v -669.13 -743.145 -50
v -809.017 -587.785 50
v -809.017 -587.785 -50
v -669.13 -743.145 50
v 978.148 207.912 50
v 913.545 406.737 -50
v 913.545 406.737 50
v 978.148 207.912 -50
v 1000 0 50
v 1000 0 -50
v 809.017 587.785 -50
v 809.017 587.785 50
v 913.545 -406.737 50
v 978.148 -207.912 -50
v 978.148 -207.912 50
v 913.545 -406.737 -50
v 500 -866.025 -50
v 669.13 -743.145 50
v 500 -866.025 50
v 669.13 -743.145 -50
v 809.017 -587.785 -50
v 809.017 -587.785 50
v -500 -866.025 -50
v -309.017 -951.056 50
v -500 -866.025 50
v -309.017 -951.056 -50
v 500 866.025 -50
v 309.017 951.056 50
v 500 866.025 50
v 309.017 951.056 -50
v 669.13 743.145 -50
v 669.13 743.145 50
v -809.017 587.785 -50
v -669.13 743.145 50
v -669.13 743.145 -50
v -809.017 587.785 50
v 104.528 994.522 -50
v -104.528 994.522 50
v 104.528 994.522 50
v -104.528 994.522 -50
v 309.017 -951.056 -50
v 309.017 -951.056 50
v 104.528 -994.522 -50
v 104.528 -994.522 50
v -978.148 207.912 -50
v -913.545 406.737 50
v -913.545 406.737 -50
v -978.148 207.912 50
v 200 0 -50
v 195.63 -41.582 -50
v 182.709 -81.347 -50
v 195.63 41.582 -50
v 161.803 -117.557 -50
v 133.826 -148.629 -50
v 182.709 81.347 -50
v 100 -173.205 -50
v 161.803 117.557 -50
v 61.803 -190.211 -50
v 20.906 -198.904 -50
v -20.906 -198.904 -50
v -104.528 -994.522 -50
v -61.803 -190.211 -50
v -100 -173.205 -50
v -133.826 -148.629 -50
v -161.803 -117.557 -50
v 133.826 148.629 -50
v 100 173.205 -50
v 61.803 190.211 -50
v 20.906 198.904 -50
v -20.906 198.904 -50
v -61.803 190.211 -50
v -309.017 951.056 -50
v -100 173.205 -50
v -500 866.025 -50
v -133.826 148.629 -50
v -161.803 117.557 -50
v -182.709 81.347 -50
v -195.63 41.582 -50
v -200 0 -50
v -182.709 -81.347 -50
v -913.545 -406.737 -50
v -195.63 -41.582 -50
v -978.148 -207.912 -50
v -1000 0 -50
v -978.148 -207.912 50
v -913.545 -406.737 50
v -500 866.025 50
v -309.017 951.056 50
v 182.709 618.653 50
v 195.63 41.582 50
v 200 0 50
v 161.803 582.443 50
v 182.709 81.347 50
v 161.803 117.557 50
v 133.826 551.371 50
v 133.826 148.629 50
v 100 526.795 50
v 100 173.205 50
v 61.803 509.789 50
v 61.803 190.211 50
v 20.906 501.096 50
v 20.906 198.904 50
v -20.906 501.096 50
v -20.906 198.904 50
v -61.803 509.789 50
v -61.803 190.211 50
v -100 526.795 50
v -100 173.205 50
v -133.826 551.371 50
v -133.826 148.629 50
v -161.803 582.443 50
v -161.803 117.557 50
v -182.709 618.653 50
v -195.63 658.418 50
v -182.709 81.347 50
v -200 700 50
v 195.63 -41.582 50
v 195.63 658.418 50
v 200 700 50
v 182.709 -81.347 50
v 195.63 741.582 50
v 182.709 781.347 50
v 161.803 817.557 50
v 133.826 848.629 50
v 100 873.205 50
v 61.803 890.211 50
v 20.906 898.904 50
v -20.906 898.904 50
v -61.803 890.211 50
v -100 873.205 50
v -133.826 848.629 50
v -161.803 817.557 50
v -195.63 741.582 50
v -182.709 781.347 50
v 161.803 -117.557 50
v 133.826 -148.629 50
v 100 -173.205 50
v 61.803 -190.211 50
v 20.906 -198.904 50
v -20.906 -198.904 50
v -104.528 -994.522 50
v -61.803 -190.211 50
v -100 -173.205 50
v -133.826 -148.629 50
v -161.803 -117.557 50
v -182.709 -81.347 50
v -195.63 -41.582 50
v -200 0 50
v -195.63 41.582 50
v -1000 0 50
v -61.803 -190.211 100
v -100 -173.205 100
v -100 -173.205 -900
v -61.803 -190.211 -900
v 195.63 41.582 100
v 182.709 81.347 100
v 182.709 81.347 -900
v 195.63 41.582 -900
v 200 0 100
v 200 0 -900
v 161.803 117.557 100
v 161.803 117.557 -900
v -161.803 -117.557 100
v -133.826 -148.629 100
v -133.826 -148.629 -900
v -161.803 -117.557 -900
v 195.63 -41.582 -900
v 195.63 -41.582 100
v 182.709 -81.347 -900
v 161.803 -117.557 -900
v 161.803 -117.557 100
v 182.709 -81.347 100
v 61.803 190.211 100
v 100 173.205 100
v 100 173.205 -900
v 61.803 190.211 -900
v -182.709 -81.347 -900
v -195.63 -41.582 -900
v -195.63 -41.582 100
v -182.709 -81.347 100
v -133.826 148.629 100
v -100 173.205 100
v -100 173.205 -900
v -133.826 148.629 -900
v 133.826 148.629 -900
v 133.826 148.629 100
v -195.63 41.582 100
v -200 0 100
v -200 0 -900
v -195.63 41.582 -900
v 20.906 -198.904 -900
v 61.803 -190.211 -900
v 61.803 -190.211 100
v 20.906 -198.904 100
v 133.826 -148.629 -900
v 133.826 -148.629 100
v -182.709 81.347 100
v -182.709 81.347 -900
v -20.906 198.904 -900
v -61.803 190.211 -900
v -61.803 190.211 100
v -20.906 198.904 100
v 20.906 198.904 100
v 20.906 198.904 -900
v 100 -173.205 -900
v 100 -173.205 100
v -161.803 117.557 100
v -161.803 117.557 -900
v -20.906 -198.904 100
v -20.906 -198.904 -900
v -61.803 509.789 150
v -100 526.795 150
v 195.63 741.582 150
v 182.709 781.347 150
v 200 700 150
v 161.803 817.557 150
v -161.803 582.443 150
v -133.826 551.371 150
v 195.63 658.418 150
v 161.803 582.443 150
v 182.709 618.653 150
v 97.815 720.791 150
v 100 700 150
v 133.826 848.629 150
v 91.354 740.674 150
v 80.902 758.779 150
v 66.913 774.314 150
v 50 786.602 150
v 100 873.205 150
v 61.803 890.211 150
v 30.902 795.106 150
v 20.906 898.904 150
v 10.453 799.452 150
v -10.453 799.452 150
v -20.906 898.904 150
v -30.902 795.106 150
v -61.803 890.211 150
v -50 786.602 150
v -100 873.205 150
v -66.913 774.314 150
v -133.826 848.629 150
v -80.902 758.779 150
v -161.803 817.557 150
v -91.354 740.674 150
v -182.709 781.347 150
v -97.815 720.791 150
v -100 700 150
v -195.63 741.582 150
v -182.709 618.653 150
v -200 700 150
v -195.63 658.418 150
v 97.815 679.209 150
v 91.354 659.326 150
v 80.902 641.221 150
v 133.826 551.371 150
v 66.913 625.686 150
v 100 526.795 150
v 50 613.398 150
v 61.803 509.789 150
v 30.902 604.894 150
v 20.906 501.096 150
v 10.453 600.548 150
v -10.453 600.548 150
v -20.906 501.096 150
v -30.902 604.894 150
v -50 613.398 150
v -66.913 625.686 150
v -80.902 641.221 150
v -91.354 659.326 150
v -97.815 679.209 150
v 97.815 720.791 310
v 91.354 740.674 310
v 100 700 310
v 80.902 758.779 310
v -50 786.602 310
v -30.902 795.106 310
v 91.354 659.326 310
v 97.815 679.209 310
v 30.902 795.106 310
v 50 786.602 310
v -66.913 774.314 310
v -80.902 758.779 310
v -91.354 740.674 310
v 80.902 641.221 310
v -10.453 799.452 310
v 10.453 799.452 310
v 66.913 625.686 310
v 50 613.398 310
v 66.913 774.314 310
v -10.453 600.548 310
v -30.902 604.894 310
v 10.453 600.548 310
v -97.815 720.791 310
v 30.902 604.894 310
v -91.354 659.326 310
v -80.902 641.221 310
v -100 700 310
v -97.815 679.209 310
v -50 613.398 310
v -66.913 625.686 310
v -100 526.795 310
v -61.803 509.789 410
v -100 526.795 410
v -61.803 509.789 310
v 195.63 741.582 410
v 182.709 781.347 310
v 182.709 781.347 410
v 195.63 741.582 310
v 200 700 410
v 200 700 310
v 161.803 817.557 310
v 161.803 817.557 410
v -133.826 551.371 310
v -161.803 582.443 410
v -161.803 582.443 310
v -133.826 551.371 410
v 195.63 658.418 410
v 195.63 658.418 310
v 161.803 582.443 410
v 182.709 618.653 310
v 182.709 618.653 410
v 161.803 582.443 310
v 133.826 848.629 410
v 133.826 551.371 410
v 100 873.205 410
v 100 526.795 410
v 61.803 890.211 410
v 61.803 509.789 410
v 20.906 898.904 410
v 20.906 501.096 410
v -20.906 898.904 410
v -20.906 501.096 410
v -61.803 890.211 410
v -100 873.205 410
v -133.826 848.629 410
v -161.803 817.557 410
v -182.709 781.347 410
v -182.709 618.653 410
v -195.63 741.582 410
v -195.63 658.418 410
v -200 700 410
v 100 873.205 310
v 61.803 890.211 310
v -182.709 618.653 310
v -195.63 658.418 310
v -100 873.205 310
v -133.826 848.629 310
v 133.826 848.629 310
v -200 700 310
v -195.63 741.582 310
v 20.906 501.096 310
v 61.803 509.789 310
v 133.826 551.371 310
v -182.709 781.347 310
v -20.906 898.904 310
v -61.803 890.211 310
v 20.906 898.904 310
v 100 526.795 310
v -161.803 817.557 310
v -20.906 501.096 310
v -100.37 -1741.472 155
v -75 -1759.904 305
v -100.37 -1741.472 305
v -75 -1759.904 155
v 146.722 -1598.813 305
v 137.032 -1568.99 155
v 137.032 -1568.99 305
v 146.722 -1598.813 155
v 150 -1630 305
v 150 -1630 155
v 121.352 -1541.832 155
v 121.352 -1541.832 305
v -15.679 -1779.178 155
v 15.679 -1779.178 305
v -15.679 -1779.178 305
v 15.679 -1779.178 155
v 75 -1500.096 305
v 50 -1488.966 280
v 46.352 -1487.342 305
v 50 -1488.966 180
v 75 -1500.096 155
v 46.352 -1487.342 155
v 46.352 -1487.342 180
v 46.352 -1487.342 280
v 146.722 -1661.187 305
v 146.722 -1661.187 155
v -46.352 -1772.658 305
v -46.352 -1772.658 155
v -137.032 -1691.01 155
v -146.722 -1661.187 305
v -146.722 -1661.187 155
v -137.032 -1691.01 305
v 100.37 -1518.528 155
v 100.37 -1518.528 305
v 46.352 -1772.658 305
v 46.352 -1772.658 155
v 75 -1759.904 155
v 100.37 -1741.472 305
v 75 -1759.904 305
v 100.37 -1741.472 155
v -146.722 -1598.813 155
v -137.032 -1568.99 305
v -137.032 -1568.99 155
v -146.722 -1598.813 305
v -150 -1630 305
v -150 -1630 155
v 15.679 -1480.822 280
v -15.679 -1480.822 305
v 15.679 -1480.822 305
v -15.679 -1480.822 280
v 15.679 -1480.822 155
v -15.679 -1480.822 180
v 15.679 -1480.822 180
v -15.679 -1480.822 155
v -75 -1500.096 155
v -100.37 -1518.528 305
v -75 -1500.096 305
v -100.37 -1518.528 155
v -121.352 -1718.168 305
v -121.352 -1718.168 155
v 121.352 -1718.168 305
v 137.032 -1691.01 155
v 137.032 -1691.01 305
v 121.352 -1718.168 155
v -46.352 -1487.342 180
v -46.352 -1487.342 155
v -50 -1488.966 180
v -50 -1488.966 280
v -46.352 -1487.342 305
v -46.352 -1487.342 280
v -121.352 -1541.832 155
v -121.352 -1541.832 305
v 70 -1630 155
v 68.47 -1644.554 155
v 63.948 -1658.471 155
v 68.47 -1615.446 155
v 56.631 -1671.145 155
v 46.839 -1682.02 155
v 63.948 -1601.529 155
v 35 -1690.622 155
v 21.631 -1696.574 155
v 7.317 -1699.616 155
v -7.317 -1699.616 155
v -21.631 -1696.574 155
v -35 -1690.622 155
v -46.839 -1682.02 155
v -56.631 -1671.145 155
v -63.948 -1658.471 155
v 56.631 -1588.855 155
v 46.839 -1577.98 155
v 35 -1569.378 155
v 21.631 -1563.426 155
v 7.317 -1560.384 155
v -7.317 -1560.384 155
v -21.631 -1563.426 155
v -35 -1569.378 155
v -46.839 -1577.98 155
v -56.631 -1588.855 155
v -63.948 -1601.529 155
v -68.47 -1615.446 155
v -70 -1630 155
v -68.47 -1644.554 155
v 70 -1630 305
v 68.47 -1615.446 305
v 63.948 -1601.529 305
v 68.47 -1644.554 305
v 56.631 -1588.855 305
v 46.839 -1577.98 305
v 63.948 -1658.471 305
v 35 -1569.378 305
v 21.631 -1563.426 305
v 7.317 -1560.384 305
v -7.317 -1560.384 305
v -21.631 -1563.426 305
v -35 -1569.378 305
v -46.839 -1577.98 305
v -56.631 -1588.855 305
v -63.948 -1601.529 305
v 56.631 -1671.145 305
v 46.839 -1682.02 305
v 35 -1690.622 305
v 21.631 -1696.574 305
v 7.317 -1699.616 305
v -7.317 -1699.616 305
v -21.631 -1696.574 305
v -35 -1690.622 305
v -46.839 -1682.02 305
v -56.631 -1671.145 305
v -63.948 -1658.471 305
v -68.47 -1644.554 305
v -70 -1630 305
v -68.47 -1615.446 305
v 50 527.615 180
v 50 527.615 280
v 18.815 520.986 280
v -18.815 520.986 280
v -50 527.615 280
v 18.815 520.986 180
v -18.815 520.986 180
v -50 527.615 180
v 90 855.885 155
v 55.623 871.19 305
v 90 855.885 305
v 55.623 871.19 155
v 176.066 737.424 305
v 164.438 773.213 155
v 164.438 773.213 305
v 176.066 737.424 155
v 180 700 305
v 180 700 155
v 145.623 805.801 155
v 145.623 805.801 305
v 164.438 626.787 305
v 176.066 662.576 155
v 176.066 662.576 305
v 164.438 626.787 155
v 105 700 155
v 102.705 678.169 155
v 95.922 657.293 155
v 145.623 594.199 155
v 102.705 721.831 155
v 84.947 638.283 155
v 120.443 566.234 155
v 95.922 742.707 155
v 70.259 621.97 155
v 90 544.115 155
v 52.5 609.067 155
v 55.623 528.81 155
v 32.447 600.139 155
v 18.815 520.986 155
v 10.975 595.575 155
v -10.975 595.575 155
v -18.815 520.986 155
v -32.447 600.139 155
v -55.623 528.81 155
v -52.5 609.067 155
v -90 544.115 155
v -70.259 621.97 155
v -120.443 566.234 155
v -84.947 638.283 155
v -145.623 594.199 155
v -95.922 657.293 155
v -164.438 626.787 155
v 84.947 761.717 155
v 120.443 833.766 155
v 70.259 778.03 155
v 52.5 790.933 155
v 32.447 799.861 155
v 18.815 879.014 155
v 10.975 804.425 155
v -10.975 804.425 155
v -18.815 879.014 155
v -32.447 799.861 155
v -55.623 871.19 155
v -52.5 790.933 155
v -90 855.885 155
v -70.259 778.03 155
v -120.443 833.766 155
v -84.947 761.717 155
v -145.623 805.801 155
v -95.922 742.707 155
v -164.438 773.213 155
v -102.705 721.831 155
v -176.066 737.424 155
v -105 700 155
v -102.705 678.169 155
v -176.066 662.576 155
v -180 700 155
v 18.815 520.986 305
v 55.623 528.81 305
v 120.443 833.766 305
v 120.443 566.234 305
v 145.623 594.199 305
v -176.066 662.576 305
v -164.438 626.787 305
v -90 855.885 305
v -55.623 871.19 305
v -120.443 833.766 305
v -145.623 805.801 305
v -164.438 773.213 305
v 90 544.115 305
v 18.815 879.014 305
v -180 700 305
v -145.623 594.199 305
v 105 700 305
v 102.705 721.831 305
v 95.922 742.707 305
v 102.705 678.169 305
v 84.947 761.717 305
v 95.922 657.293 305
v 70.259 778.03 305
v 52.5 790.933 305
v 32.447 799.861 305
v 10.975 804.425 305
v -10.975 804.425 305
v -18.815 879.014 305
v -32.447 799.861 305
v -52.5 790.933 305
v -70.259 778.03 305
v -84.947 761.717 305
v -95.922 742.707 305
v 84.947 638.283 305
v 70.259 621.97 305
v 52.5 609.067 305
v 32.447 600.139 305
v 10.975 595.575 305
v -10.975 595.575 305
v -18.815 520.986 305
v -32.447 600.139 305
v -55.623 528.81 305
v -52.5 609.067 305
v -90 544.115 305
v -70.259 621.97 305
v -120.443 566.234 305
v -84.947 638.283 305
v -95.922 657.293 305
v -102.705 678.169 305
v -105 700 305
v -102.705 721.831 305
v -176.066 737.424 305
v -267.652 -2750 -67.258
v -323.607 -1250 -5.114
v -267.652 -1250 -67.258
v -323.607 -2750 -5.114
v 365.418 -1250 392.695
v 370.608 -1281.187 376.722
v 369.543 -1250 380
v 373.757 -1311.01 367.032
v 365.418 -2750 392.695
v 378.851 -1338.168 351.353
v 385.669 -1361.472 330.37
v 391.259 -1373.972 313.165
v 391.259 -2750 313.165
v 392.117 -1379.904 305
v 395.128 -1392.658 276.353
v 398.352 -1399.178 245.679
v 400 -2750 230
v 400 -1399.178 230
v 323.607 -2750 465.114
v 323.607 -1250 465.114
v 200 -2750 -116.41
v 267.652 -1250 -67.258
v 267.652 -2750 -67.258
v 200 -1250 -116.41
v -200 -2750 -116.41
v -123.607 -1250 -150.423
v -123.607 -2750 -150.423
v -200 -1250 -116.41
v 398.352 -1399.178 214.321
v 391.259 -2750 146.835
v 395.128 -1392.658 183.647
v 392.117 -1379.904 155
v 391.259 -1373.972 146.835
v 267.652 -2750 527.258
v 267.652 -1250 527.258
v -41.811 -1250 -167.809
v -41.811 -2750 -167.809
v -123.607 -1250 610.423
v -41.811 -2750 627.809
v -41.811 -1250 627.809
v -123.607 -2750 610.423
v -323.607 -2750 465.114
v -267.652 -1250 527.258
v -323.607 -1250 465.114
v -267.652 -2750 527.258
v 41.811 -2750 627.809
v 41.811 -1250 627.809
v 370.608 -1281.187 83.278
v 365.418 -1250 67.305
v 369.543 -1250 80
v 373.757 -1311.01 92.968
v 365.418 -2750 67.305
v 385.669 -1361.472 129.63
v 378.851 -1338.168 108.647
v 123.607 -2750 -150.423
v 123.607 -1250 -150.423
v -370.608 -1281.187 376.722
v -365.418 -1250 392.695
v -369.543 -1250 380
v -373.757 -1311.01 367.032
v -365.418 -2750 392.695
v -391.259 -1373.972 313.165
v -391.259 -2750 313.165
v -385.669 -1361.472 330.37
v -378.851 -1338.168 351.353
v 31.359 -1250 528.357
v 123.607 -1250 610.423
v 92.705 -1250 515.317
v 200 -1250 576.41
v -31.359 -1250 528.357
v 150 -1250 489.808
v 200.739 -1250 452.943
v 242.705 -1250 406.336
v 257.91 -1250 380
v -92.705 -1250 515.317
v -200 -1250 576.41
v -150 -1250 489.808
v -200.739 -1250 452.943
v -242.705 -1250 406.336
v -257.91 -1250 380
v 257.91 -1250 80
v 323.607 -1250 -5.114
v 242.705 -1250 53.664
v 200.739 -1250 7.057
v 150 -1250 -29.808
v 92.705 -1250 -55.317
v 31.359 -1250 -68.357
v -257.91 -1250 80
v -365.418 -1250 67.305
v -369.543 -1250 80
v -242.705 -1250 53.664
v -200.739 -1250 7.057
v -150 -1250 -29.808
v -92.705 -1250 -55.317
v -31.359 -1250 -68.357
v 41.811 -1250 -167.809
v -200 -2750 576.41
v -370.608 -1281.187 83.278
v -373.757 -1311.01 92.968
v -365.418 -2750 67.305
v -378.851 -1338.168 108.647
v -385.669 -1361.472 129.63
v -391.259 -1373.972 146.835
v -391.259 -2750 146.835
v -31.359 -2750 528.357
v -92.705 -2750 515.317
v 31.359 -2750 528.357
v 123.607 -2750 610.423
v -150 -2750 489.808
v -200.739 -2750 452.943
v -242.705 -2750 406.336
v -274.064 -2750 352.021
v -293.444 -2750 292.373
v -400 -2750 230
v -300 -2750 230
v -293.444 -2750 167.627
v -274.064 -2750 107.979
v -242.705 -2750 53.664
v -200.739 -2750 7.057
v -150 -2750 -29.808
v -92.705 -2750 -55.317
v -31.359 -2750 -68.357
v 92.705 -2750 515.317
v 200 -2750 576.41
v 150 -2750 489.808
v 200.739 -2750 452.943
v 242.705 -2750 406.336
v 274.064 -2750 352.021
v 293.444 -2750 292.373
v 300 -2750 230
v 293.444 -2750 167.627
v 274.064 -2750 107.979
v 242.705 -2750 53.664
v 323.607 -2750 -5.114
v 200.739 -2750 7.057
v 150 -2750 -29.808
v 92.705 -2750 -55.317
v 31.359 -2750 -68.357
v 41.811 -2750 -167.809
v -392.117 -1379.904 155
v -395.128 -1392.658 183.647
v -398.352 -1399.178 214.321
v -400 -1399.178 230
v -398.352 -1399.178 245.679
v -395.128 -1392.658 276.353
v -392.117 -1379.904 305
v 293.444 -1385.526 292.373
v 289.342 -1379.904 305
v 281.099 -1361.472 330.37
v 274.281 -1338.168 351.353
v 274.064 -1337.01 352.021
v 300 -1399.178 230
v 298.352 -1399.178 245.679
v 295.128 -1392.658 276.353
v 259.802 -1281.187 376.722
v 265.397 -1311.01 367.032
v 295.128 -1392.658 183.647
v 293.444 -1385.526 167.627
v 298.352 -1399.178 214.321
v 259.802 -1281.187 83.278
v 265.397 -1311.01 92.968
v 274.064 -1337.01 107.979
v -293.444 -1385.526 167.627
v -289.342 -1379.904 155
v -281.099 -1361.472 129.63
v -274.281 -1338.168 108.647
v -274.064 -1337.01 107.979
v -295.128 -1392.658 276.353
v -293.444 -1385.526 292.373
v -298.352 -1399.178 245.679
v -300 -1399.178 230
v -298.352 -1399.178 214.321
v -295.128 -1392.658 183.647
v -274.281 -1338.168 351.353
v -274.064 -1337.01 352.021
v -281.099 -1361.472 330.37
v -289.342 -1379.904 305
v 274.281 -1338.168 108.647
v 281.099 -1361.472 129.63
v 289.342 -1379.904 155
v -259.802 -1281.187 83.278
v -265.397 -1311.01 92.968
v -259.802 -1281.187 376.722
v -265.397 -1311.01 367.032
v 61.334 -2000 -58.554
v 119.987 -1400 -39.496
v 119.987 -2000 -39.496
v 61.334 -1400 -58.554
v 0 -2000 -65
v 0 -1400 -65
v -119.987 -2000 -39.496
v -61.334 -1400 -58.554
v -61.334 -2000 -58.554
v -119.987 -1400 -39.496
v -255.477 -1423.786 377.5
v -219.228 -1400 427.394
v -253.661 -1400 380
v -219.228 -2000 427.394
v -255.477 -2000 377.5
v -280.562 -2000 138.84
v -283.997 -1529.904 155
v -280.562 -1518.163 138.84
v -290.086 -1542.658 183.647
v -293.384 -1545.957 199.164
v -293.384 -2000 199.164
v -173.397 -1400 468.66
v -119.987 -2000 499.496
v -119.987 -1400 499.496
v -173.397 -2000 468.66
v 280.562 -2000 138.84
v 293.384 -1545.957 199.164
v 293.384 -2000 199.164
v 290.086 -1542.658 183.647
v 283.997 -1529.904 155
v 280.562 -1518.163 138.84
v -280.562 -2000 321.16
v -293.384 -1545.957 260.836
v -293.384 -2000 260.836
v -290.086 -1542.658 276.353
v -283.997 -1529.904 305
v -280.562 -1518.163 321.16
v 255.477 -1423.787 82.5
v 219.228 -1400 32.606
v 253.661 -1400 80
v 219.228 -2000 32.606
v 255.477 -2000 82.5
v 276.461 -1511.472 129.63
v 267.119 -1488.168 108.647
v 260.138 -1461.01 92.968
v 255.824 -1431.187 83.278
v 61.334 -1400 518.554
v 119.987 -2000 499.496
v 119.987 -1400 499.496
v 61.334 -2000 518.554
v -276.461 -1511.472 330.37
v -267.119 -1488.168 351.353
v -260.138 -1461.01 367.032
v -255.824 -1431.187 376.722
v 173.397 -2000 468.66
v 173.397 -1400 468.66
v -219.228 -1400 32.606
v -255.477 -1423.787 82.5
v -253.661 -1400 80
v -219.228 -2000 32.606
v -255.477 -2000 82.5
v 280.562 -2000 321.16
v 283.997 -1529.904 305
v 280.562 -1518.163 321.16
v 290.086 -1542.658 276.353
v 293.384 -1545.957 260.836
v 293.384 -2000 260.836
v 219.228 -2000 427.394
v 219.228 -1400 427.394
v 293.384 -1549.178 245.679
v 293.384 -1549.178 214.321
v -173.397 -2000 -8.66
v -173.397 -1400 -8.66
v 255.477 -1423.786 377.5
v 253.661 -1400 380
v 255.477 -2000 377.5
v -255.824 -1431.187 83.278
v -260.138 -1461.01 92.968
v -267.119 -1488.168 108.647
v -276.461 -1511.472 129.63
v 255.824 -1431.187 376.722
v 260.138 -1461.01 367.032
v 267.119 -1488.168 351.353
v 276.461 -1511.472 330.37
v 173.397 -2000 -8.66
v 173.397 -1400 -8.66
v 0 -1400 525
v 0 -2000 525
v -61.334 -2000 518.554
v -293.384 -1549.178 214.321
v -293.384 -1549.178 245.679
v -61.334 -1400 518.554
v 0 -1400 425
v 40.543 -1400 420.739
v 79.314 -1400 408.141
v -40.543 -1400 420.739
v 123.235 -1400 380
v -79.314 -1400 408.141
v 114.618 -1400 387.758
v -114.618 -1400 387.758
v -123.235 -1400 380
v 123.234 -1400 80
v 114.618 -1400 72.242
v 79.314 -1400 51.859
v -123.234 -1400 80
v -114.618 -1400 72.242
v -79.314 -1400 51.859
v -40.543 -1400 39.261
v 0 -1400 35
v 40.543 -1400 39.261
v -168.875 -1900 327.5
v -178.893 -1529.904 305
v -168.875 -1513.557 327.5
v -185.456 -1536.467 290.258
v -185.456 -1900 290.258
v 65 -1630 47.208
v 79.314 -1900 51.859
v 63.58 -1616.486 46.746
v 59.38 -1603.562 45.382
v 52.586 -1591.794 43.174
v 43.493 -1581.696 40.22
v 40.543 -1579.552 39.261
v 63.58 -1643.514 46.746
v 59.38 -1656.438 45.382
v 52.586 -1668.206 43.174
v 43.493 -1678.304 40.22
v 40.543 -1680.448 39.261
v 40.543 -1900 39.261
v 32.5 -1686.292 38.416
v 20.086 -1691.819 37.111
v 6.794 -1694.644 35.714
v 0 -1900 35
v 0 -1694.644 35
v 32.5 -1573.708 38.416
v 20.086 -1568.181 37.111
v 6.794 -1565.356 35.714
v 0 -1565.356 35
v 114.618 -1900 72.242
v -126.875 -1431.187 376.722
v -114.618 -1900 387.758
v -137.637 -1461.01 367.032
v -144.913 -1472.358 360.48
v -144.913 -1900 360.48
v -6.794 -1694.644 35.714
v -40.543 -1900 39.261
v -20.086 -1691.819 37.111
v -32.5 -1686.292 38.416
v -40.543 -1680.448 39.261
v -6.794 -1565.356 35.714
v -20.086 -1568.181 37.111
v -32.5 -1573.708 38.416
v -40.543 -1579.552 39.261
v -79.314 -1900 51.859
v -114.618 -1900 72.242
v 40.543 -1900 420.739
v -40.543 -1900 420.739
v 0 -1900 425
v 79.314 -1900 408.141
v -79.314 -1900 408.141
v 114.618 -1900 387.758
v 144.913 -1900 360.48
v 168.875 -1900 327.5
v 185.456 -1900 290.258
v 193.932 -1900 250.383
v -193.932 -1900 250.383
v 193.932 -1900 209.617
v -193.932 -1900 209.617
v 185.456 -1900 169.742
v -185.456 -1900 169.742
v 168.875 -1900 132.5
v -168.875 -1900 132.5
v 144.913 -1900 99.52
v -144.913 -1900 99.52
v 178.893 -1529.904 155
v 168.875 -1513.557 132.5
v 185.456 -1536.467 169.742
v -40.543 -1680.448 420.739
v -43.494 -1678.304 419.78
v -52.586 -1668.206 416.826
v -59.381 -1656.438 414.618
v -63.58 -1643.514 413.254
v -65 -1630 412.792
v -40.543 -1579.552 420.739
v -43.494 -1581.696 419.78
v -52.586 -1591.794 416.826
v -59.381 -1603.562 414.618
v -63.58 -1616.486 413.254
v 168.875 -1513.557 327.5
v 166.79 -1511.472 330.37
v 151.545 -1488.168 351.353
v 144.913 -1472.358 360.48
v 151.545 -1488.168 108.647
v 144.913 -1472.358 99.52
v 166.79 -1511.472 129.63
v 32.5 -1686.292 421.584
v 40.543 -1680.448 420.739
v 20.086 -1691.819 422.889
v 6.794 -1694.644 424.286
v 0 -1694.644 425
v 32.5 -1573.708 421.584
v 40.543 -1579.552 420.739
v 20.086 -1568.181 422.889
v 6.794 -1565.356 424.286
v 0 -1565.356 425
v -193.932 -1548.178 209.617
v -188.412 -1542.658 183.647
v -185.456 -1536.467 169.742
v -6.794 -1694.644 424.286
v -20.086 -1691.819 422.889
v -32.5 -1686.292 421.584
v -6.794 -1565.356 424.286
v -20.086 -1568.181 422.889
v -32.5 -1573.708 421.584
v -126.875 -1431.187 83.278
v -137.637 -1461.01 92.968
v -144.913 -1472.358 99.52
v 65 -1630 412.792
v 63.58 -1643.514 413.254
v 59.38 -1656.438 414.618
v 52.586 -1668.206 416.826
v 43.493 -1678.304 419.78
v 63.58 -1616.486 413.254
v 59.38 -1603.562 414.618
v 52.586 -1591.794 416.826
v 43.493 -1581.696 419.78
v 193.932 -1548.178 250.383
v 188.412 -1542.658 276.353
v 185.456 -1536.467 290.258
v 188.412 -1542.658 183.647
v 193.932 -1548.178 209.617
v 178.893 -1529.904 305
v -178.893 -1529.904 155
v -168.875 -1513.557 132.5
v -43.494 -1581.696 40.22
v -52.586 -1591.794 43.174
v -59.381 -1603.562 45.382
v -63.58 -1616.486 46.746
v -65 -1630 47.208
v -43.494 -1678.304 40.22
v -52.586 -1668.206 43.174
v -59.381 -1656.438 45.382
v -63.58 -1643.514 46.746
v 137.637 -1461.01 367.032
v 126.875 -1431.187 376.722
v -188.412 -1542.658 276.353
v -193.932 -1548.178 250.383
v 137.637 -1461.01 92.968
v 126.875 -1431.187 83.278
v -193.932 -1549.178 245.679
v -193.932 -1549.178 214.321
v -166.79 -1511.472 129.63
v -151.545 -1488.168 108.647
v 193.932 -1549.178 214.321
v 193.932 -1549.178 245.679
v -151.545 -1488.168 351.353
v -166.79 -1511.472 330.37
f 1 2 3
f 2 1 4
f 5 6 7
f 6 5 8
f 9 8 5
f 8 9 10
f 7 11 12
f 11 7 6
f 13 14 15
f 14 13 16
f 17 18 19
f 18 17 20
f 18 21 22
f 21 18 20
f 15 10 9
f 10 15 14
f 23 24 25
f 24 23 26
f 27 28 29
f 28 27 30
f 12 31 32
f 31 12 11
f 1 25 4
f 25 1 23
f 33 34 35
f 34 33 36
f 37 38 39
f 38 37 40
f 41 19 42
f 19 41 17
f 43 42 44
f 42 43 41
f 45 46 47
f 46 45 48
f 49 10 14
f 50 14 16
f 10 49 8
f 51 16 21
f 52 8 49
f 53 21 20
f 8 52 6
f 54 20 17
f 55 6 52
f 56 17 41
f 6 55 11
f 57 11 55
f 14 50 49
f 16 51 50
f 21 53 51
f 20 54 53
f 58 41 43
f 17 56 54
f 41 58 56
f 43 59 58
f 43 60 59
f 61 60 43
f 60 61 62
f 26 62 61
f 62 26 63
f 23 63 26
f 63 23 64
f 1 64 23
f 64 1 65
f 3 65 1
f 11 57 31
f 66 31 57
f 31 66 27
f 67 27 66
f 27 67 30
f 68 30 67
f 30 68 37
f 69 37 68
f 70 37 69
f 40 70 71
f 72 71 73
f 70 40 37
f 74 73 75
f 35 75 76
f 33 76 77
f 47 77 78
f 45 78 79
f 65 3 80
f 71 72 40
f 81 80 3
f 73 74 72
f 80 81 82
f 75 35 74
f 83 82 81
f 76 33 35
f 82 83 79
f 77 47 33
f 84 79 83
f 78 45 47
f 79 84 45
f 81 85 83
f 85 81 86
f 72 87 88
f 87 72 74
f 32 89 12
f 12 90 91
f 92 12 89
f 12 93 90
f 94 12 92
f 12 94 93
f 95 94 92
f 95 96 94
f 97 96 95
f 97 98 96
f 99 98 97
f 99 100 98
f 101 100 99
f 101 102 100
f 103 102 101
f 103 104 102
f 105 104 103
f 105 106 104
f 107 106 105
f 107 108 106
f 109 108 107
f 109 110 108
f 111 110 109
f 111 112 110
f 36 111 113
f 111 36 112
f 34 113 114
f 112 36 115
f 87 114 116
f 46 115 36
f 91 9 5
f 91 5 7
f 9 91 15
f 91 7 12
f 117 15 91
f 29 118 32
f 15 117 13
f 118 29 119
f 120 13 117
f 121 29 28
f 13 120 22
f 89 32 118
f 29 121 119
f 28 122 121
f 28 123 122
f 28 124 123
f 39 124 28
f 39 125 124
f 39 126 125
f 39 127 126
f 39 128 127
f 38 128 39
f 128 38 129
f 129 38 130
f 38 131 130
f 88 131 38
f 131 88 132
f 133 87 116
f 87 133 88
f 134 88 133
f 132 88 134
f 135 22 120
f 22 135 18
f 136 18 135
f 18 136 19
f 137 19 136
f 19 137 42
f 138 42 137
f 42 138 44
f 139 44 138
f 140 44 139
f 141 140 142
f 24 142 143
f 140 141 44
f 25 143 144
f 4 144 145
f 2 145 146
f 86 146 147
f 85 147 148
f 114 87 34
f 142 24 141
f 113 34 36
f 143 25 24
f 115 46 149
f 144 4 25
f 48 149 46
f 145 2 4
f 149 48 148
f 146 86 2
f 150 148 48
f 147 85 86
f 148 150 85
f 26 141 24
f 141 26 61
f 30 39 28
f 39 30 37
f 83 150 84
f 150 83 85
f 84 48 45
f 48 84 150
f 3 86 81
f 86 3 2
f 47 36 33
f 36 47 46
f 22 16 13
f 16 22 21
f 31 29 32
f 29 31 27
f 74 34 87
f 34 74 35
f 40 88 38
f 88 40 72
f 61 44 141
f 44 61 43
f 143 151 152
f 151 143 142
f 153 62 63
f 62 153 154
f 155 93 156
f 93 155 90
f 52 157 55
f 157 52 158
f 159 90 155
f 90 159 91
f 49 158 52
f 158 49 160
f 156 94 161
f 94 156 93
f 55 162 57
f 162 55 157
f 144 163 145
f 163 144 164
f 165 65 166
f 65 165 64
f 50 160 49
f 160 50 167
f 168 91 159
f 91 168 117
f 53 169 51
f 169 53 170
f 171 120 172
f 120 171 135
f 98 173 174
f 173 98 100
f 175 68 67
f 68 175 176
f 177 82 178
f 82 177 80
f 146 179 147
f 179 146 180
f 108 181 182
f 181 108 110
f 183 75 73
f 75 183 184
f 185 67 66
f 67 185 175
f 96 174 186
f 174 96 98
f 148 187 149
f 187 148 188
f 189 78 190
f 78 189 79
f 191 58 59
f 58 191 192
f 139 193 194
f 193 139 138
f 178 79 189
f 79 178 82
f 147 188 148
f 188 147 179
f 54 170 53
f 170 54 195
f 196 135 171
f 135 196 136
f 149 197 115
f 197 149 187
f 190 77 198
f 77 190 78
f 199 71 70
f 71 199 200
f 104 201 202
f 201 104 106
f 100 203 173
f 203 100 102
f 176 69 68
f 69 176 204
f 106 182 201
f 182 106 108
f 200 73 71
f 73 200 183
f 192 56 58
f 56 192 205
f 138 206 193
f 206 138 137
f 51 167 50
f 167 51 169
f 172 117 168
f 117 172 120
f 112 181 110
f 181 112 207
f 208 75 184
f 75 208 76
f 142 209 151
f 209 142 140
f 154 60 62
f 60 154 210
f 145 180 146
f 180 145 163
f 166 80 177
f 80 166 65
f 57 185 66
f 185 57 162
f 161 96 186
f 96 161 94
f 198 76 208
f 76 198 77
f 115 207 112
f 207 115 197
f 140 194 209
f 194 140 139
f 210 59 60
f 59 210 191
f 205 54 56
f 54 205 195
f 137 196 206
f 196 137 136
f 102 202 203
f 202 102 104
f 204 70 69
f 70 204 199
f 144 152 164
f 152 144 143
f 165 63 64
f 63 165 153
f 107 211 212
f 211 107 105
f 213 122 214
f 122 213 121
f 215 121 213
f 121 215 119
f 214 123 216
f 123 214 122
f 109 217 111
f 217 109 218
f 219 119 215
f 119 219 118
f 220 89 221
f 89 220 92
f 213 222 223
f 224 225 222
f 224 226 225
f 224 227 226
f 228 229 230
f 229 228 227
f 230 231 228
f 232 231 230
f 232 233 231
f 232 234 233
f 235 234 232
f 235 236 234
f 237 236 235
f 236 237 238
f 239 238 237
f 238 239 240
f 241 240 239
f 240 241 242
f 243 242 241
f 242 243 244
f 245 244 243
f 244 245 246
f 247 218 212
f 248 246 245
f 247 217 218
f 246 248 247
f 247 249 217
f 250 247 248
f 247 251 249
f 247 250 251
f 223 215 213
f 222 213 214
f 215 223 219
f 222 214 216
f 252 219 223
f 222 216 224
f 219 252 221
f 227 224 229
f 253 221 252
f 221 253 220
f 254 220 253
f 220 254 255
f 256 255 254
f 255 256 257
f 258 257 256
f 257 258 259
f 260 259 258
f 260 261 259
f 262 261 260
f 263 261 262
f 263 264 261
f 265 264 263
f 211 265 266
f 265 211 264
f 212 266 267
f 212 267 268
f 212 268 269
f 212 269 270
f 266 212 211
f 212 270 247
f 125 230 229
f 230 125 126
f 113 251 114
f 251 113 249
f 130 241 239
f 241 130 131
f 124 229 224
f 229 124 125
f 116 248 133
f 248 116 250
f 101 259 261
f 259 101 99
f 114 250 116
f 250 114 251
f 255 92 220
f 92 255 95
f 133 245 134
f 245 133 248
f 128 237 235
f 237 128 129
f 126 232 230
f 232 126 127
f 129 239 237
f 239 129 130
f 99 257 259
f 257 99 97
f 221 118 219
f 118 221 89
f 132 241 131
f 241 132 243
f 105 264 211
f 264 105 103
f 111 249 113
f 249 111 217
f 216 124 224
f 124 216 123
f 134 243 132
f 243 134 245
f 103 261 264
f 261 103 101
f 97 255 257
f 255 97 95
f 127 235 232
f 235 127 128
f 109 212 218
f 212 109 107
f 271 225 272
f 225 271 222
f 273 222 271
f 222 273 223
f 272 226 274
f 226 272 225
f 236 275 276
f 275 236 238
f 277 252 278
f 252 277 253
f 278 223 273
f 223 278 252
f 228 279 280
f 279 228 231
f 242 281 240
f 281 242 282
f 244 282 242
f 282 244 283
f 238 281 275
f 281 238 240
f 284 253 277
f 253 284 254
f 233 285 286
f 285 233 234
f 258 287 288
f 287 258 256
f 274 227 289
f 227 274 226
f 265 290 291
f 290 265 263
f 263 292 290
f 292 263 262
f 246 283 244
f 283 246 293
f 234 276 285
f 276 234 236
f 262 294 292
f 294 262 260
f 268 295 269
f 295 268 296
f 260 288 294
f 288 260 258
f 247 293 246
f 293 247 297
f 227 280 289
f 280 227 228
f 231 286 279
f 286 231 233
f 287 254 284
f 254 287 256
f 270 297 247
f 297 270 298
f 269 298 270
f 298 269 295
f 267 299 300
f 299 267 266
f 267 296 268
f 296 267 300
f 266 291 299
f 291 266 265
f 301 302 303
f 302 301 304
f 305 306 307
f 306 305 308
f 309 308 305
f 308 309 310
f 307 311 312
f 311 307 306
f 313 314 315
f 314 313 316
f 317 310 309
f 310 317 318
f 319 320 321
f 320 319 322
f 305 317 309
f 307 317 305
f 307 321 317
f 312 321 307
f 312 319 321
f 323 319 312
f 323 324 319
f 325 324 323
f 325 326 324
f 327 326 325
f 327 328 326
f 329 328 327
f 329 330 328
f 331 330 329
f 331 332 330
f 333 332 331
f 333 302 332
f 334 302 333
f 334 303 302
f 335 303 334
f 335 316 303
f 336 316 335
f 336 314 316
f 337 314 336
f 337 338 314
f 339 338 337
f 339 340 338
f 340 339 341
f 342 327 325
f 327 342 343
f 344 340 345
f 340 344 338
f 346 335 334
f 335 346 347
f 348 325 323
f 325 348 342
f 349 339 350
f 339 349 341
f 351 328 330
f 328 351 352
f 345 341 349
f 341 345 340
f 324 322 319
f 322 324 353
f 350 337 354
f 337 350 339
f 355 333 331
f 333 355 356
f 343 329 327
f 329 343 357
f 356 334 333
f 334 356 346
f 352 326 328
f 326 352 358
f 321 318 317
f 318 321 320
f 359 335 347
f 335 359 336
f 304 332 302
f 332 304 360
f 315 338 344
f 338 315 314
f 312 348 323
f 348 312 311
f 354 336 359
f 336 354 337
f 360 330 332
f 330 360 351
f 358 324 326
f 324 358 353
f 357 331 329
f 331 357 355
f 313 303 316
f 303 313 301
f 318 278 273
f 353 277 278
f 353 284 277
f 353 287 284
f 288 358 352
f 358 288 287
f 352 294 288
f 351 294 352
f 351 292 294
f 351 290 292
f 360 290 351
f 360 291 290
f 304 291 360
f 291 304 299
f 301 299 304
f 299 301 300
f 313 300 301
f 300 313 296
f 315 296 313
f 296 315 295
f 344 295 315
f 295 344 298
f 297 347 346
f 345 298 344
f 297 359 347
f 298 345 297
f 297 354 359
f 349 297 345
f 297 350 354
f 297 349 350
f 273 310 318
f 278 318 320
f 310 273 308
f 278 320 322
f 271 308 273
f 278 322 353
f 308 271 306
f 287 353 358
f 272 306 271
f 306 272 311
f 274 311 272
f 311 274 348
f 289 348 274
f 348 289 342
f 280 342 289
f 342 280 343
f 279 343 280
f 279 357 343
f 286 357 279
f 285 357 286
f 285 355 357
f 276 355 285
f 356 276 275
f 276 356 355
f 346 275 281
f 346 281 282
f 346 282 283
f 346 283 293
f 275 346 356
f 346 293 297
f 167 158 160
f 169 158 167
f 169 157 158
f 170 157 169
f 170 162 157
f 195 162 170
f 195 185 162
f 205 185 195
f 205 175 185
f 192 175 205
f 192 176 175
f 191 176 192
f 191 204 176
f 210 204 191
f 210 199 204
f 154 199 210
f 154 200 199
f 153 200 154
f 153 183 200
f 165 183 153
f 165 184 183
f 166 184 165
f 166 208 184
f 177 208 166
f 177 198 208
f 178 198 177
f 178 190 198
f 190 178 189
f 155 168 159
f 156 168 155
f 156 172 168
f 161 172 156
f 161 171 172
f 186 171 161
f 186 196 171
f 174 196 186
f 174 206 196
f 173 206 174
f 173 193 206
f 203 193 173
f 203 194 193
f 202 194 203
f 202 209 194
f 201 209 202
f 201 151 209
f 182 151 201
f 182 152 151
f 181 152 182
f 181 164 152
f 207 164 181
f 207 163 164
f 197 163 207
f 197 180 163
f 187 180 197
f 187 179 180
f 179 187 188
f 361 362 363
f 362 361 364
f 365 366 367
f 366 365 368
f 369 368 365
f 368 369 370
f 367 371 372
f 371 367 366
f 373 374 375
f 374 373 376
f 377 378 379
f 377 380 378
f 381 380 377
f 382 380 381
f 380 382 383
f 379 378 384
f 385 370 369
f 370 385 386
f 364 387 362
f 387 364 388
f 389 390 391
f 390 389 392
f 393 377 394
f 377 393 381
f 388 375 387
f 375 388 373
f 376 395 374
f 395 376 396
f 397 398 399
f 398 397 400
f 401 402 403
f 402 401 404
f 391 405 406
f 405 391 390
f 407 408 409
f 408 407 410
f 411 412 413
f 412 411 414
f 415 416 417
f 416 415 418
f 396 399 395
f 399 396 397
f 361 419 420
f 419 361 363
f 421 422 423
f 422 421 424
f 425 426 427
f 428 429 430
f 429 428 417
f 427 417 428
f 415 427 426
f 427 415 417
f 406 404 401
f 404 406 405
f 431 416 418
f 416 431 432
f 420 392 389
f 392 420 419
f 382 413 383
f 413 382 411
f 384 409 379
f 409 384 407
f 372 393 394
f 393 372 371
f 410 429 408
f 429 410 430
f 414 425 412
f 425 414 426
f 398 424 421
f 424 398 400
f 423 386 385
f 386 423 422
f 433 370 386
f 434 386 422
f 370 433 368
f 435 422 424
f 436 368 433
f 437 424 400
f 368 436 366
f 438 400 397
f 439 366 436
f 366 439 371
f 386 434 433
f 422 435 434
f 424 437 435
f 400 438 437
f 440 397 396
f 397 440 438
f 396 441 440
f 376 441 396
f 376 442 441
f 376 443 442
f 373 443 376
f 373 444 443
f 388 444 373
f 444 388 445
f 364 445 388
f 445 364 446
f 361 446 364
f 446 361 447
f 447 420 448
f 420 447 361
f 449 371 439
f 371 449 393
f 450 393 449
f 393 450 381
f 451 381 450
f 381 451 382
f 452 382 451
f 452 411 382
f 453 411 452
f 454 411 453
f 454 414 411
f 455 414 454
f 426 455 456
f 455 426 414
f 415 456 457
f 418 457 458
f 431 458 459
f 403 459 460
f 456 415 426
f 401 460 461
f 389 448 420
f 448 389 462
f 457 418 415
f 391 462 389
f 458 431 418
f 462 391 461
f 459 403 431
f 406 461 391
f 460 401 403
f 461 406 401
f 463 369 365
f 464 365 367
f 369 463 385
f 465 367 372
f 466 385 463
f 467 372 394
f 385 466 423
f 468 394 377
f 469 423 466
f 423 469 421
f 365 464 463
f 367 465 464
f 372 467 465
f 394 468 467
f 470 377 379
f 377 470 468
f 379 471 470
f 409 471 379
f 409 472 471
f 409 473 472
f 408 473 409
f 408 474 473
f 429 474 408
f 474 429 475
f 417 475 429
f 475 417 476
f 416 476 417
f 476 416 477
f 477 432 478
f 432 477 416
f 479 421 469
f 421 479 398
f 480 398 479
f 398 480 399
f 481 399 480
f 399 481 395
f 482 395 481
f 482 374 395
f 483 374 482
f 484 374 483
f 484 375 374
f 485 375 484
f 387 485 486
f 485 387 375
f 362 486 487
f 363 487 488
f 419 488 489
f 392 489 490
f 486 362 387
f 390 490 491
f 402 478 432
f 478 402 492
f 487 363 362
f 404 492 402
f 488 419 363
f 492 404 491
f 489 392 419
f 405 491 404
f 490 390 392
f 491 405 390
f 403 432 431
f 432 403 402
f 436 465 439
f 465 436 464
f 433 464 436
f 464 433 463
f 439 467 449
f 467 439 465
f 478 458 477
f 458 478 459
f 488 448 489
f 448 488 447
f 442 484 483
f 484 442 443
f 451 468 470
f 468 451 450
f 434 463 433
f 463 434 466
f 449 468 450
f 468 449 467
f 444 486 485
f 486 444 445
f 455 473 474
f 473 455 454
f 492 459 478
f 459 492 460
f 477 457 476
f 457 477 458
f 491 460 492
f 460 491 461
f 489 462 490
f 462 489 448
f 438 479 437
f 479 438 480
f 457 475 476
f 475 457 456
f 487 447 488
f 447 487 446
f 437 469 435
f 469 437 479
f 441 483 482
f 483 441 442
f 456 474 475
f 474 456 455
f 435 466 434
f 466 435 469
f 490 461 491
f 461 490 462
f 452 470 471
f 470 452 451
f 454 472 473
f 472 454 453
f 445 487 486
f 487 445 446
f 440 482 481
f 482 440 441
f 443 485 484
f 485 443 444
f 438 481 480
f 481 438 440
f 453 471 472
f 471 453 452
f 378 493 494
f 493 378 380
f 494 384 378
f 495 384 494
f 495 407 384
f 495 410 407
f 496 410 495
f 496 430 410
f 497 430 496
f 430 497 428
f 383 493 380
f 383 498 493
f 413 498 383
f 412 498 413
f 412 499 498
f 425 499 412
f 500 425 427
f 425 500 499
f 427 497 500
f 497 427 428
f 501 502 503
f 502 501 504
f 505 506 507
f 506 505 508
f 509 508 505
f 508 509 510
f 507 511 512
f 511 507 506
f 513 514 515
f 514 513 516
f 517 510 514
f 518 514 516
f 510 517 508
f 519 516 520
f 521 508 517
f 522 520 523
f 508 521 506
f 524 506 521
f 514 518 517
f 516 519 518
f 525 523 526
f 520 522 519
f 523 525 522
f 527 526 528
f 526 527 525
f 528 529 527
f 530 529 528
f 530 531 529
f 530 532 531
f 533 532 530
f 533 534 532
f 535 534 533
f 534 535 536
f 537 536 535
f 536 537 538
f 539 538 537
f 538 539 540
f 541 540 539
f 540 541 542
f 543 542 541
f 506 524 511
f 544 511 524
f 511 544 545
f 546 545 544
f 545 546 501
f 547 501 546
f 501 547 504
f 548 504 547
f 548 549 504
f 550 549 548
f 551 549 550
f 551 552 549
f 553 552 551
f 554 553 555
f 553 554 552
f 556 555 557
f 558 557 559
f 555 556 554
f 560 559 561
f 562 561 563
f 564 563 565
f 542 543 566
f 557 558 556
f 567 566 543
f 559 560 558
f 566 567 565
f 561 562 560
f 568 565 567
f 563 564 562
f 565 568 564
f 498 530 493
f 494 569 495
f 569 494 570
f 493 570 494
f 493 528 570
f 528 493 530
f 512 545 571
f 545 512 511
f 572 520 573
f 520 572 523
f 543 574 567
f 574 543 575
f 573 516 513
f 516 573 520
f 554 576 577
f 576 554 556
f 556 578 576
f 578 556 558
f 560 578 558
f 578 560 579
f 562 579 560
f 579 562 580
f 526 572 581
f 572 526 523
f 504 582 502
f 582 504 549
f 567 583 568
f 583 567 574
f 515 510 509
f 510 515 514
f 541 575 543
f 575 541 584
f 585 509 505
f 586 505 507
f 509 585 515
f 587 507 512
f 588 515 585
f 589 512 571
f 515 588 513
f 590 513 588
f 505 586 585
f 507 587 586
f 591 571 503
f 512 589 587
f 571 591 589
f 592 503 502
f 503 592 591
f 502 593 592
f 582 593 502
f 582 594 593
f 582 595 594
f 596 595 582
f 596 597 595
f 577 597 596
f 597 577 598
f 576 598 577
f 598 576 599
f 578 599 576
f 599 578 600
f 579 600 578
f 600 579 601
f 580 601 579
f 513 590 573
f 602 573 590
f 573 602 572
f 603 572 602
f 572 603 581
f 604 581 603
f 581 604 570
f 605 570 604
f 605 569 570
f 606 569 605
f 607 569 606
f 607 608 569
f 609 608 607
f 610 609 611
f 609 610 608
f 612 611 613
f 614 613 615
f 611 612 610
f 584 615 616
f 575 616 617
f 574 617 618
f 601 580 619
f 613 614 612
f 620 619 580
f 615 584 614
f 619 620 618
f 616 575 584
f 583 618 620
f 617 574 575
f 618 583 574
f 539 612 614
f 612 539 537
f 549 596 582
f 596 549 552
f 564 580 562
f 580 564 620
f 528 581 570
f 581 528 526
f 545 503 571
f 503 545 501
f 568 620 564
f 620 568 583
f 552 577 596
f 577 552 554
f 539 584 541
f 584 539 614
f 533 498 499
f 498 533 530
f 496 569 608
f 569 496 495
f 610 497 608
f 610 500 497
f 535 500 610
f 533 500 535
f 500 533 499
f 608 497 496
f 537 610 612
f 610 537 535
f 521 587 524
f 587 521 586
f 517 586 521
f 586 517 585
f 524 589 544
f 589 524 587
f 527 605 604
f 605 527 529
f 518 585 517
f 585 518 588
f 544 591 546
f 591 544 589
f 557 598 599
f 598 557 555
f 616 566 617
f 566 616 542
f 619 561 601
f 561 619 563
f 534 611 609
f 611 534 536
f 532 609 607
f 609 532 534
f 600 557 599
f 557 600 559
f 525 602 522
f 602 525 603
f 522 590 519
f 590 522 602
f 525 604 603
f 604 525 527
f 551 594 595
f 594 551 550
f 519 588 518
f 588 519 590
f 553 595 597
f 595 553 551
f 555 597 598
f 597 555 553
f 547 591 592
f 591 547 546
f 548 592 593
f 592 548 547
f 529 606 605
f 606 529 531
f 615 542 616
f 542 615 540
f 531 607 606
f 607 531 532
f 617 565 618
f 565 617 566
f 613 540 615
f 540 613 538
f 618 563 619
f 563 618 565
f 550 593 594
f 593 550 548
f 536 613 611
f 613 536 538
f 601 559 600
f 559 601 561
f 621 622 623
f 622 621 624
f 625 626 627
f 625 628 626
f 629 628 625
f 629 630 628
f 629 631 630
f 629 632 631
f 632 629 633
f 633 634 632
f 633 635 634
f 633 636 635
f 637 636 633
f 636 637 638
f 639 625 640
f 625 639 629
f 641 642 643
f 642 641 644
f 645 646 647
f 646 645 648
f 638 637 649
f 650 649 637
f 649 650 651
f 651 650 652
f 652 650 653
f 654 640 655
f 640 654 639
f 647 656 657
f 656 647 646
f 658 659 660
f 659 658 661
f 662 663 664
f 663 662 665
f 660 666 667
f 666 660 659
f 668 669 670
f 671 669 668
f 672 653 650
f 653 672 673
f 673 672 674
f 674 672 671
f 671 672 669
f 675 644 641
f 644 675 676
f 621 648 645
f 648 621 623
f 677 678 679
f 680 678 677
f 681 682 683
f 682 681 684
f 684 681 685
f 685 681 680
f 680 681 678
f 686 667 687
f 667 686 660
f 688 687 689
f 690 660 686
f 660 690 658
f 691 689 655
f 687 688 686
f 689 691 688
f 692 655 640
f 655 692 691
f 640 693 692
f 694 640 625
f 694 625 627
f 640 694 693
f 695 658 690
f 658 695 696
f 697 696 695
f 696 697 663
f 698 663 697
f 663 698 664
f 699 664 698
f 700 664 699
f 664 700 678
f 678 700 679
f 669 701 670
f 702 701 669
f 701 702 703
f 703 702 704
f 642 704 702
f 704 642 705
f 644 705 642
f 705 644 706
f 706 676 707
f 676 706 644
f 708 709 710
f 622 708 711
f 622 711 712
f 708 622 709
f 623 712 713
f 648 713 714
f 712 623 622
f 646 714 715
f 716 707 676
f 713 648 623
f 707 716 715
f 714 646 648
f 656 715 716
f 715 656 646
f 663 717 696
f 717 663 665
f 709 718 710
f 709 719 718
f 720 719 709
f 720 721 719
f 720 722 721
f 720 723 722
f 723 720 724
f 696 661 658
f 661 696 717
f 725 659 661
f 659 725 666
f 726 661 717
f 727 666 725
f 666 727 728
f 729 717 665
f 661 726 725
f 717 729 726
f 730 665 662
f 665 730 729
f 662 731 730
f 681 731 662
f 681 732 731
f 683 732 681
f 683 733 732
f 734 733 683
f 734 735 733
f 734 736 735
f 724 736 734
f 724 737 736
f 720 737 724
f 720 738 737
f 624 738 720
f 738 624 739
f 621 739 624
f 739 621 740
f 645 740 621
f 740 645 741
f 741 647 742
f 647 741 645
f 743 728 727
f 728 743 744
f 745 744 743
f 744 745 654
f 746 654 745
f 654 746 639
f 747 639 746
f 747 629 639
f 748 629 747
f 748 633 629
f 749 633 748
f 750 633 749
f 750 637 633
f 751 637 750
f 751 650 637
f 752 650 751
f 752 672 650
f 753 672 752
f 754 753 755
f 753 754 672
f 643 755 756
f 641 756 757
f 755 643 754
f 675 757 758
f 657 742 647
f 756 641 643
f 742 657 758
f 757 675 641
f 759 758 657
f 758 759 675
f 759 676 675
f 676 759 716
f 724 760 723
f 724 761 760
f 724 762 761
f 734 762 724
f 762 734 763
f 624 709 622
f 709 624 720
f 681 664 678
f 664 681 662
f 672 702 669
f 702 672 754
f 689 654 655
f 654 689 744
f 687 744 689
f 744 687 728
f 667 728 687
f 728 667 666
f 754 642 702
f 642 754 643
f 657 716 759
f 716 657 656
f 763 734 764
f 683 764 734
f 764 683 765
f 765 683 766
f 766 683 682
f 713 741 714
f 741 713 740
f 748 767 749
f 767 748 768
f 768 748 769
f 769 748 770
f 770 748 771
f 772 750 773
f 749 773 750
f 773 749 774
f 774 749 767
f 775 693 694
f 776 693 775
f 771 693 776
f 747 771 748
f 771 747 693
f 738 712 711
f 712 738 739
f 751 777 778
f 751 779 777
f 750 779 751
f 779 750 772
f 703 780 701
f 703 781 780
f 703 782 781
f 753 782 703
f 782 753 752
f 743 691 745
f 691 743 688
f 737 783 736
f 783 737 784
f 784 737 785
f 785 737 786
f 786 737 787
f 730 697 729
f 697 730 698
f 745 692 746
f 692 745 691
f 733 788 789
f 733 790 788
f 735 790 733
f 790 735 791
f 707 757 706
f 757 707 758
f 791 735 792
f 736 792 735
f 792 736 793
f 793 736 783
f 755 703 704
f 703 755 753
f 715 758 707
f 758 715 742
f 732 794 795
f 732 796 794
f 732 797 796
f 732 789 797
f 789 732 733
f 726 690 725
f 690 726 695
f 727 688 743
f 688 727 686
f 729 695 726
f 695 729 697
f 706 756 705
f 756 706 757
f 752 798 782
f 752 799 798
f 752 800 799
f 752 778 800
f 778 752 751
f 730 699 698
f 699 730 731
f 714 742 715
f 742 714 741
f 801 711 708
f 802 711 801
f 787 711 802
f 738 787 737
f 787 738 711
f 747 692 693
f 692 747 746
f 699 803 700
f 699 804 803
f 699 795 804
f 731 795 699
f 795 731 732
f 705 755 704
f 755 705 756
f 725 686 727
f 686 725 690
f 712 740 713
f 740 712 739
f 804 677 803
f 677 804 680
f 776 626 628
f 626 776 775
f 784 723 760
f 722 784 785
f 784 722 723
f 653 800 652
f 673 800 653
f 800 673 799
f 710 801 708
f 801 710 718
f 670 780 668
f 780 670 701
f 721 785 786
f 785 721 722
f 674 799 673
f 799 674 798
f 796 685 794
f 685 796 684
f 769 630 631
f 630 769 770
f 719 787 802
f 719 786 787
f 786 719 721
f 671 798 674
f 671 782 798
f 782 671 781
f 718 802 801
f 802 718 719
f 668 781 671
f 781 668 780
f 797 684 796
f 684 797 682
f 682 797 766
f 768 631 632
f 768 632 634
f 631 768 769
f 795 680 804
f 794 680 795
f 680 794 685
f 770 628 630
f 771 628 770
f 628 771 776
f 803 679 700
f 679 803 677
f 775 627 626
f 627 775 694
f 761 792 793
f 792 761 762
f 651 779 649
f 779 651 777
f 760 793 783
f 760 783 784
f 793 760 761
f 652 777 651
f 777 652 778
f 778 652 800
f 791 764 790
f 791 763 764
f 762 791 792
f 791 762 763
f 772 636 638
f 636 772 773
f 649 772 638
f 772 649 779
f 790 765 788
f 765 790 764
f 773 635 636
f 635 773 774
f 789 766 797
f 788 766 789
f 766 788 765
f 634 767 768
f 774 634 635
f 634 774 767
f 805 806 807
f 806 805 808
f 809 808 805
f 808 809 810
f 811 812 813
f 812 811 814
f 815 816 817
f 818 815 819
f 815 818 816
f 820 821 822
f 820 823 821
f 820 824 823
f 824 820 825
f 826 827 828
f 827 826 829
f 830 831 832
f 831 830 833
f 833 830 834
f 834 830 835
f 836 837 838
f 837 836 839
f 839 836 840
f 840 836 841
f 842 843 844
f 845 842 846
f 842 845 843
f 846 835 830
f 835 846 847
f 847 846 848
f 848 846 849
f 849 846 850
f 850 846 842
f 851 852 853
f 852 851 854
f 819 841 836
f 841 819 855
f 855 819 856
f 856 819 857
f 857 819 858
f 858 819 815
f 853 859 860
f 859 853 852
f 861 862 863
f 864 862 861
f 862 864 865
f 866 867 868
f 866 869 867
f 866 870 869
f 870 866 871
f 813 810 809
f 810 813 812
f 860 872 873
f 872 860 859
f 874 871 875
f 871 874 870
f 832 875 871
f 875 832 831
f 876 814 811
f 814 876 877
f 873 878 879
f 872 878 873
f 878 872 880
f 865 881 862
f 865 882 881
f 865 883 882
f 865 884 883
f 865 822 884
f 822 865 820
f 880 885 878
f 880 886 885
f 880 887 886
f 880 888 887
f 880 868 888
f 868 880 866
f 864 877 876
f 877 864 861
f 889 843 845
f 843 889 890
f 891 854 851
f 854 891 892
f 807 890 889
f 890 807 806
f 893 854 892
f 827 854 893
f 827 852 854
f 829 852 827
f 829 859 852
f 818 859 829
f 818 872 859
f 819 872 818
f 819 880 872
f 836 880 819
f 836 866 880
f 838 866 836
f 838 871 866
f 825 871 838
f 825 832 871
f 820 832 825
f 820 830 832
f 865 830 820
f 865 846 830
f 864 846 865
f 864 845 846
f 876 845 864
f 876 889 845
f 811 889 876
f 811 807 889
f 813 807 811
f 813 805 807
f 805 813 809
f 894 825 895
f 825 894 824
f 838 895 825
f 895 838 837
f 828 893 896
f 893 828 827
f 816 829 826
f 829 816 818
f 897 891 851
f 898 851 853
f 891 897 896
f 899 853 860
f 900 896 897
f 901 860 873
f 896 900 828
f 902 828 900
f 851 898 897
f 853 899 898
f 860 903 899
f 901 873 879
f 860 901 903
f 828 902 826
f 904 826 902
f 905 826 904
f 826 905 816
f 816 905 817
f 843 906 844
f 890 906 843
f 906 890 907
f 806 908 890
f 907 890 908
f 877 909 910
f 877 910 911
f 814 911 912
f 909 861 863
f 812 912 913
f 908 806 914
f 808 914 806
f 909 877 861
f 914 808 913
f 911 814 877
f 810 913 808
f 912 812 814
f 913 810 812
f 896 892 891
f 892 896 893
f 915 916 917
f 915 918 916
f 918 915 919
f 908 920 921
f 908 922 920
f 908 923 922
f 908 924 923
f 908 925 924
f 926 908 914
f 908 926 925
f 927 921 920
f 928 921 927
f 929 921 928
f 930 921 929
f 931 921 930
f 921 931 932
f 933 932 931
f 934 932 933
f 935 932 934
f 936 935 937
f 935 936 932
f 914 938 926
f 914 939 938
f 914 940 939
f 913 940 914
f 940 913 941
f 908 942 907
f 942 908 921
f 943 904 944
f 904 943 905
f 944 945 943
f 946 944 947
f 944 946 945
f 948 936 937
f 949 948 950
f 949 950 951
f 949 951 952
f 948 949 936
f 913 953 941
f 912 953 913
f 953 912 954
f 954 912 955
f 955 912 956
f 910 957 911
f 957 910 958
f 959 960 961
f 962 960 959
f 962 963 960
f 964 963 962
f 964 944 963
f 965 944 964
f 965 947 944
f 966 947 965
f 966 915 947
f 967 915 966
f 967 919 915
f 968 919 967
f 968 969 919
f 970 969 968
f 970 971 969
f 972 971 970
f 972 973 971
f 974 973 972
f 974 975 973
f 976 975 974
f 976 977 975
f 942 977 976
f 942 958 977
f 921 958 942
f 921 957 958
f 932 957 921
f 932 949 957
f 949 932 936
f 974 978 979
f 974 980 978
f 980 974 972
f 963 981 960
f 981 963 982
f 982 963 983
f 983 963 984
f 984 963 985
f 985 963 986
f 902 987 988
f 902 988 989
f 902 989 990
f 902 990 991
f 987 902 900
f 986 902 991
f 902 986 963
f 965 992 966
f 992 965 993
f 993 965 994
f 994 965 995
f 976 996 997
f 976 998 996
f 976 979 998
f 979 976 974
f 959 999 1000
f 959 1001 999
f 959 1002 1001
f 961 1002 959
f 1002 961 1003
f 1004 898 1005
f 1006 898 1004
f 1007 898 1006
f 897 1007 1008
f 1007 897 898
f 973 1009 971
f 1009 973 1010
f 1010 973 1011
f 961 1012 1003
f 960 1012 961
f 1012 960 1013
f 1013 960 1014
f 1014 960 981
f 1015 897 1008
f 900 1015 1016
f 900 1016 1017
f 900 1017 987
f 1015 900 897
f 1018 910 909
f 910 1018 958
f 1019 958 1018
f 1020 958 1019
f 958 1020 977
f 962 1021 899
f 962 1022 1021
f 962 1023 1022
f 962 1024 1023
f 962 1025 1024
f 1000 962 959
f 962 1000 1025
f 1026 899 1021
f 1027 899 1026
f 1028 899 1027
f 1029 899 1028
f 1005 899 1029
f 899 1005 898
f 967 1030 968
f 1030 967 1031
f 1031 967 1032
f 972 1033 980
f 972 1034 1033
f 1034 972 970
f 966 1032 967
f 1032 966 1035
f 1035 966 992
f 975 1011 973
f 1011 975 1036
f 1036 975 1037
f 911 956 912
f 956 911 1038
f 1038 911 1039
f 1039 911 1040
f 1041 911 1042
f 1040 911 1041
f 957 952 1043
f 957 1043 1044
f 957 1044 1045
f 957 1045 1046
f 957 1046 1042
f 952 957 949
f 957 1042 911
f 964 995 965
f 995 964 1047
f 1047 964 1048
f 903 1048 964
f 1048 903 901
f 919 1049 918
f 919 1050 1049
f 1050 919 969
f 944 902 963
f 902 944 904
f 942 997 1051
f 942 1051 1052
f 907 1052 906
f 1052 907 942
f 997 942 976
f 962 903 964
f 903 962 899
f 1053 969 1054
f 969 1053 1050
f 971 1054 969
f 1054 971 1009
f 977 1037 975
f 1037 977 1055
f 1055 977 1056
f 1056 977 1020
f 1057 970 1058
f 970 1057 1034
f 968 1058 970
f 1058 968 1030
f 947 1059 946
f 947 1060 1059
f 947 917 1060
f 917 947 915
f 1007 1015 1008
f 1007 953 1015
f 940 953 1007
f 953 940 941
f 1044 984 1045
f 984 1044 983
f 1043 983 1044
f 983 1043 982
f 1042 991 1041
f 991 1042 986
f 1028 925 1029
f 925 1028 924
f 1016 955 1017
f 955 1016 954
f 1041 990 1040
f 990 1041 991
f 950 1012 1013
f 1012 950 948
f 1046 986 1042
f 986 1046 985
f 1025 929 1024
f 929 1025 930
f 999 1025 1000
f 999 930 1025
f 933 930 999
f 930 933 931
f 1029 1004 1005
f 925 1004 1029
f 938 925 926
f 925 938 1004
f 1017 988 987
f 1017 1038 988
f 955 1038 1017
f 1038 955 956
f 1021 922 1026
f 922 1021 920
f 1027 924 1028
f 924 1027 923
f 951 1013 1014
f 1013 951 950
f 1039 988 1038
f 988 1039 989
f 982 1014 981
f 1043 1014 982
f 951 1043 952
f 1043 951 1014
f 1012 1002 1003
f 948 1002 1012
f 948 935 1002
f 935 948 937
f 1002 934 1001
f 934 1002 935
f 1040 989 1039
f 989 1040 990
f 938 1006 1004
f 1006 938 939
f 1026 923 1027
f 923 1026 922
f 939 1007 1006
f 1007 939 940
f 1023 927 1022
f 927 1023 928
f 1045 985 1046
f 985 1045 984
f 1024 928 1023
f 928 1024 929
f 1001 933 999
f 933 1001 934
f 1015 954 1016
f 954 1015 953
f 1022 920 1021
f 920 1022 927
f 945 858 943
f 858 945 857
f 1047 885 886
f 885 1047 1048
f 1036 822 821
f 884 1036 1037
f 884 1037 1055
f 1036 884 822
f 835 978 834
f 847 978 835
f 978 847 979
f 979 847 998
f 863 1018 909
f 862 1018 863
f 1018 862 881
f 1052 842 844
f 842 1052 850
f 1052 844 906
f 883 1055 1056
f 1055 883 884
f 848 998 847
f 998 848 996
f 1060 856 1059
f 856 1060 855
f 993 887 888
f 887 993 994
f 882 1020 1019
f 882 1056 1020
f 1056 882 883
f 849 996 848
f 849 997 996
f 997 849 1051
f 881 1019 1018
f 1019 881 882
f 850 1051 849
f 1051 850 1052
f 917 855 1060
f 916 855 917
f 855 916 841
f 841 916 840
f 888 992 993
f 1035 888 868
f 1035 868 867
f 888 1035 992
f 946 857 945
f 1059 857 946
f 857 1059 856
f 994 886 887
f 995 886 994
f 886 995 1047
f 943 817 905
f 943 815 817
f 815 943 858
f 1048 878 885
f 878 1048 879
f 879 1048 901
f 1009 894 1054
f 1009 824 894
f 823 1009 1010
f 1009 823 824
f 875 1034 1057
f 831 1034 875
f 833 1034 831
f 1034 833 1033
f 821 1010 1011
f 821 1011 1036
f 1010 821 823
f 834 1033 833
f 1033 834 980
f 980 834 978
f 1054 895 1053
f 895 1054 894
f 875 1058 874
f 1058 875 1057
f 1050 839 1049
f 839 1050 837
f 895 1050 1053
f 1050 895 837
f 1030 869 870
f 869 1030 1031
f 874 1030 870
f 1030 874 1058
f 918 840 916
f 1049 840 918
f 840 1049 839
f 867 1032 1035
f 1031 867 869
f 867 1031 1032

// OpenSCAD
$fs=0.0001; 

axis_radius = 10;

piston_lenght = 15;
piston_radius = 4;
piston_tickness = 1;
inner_lenght = 6;

spacing = 0.05;

scale([100, 100, 100]){

//rotating part
union(){
    difference(){
        cylinder(1, axis_radius, axis_radius, true);
        cylinder(10, 2, 2, true);
    }
    translate([0, axis_radius*.7, 0.5]){
        cylinder(1, 2, 2);
        translate([0,0,1])
        cylinder(2, 1, 1);
        
        
    translate([0, 0, 2.6])
        cylinder(1, 2, 2);
    }

    translate([0, 0, -4]){
        cylinder(10, 2, 2, true);
   
    }
}


height = 2.3;




//axis
union(){
translate([0, 0, height]){
    translate([0, -axis_radius*.5, 0]){
        cube(size = [1, 2.1*axis_radius, 1], center = true);
        
        translate([0, -2.1*axis_radius/2-1.6/2, 0])rotate([0, 0, 0]){
            difference(){
            cylinder(1.5, 1.5, 1.5, true);
            cylinder(4, 0.7, 0.7, true);
            }
        }
    }
    
    translate([0, axis_radius*.7, 0]){
        difference(){
        cylinder(1.5, 1.8, 1.8, true);
        cylinder(2, 1+spacing, 1+spacing, true);
        }
    }
    

        
}
}


//piston holder
translate([0, 0, 0])
difference(){
rotate([90, 0,0])translate([0, height, axis_radius/2+piston_lenght]){
    difference(){
cylinder(piston_lenght, piston_radius, piston_radius, true);
translate([0, 0, -piston_tickness]){
   cylinder(2*piston_lenght, piston_radius-piston_tickness, piston_radius-piston_tickness, true);
   }
  }
};
translate([0,-12.5,height])rotate([0, 90, 0])translate([0,0,-5])cylinder(10, 1.5, 1.5);
}


//piston
inner_piston_r = piston_radius - piston_tickness - spacing;
difference(){
translate([0, 0, height])rotate([0, 90, 0])translate([0,0,-height])union(){
rotate([90, 0,0])translate([0, height, axis_radius/2+piston_lenght-inner_lenght/2]){
difference(){
    cylinder(inner_lenght, inner_piston_r, inner_piston_r, true);
    translate([0, 0, -piston_tickness]){
        cylinder(inner_lenght, inner_piston_r-piston_tickness, inner_piston_r-piston_tickness, true);
    }
 }


}

translate([0, -axis_radius*.5-2.1*axis_radius/2-1.6/2, height])rotate([0, 90, 0]){
cylinder(2*(inner_piston_r-piston_tickness), 0.7-spacing, 0.7-spacing, true);
}
}

translate([0,-14,height])rotate([0, 90, 0])translate([0,0,-5])cylinder(10, 1.5, 1.5);

}
}
